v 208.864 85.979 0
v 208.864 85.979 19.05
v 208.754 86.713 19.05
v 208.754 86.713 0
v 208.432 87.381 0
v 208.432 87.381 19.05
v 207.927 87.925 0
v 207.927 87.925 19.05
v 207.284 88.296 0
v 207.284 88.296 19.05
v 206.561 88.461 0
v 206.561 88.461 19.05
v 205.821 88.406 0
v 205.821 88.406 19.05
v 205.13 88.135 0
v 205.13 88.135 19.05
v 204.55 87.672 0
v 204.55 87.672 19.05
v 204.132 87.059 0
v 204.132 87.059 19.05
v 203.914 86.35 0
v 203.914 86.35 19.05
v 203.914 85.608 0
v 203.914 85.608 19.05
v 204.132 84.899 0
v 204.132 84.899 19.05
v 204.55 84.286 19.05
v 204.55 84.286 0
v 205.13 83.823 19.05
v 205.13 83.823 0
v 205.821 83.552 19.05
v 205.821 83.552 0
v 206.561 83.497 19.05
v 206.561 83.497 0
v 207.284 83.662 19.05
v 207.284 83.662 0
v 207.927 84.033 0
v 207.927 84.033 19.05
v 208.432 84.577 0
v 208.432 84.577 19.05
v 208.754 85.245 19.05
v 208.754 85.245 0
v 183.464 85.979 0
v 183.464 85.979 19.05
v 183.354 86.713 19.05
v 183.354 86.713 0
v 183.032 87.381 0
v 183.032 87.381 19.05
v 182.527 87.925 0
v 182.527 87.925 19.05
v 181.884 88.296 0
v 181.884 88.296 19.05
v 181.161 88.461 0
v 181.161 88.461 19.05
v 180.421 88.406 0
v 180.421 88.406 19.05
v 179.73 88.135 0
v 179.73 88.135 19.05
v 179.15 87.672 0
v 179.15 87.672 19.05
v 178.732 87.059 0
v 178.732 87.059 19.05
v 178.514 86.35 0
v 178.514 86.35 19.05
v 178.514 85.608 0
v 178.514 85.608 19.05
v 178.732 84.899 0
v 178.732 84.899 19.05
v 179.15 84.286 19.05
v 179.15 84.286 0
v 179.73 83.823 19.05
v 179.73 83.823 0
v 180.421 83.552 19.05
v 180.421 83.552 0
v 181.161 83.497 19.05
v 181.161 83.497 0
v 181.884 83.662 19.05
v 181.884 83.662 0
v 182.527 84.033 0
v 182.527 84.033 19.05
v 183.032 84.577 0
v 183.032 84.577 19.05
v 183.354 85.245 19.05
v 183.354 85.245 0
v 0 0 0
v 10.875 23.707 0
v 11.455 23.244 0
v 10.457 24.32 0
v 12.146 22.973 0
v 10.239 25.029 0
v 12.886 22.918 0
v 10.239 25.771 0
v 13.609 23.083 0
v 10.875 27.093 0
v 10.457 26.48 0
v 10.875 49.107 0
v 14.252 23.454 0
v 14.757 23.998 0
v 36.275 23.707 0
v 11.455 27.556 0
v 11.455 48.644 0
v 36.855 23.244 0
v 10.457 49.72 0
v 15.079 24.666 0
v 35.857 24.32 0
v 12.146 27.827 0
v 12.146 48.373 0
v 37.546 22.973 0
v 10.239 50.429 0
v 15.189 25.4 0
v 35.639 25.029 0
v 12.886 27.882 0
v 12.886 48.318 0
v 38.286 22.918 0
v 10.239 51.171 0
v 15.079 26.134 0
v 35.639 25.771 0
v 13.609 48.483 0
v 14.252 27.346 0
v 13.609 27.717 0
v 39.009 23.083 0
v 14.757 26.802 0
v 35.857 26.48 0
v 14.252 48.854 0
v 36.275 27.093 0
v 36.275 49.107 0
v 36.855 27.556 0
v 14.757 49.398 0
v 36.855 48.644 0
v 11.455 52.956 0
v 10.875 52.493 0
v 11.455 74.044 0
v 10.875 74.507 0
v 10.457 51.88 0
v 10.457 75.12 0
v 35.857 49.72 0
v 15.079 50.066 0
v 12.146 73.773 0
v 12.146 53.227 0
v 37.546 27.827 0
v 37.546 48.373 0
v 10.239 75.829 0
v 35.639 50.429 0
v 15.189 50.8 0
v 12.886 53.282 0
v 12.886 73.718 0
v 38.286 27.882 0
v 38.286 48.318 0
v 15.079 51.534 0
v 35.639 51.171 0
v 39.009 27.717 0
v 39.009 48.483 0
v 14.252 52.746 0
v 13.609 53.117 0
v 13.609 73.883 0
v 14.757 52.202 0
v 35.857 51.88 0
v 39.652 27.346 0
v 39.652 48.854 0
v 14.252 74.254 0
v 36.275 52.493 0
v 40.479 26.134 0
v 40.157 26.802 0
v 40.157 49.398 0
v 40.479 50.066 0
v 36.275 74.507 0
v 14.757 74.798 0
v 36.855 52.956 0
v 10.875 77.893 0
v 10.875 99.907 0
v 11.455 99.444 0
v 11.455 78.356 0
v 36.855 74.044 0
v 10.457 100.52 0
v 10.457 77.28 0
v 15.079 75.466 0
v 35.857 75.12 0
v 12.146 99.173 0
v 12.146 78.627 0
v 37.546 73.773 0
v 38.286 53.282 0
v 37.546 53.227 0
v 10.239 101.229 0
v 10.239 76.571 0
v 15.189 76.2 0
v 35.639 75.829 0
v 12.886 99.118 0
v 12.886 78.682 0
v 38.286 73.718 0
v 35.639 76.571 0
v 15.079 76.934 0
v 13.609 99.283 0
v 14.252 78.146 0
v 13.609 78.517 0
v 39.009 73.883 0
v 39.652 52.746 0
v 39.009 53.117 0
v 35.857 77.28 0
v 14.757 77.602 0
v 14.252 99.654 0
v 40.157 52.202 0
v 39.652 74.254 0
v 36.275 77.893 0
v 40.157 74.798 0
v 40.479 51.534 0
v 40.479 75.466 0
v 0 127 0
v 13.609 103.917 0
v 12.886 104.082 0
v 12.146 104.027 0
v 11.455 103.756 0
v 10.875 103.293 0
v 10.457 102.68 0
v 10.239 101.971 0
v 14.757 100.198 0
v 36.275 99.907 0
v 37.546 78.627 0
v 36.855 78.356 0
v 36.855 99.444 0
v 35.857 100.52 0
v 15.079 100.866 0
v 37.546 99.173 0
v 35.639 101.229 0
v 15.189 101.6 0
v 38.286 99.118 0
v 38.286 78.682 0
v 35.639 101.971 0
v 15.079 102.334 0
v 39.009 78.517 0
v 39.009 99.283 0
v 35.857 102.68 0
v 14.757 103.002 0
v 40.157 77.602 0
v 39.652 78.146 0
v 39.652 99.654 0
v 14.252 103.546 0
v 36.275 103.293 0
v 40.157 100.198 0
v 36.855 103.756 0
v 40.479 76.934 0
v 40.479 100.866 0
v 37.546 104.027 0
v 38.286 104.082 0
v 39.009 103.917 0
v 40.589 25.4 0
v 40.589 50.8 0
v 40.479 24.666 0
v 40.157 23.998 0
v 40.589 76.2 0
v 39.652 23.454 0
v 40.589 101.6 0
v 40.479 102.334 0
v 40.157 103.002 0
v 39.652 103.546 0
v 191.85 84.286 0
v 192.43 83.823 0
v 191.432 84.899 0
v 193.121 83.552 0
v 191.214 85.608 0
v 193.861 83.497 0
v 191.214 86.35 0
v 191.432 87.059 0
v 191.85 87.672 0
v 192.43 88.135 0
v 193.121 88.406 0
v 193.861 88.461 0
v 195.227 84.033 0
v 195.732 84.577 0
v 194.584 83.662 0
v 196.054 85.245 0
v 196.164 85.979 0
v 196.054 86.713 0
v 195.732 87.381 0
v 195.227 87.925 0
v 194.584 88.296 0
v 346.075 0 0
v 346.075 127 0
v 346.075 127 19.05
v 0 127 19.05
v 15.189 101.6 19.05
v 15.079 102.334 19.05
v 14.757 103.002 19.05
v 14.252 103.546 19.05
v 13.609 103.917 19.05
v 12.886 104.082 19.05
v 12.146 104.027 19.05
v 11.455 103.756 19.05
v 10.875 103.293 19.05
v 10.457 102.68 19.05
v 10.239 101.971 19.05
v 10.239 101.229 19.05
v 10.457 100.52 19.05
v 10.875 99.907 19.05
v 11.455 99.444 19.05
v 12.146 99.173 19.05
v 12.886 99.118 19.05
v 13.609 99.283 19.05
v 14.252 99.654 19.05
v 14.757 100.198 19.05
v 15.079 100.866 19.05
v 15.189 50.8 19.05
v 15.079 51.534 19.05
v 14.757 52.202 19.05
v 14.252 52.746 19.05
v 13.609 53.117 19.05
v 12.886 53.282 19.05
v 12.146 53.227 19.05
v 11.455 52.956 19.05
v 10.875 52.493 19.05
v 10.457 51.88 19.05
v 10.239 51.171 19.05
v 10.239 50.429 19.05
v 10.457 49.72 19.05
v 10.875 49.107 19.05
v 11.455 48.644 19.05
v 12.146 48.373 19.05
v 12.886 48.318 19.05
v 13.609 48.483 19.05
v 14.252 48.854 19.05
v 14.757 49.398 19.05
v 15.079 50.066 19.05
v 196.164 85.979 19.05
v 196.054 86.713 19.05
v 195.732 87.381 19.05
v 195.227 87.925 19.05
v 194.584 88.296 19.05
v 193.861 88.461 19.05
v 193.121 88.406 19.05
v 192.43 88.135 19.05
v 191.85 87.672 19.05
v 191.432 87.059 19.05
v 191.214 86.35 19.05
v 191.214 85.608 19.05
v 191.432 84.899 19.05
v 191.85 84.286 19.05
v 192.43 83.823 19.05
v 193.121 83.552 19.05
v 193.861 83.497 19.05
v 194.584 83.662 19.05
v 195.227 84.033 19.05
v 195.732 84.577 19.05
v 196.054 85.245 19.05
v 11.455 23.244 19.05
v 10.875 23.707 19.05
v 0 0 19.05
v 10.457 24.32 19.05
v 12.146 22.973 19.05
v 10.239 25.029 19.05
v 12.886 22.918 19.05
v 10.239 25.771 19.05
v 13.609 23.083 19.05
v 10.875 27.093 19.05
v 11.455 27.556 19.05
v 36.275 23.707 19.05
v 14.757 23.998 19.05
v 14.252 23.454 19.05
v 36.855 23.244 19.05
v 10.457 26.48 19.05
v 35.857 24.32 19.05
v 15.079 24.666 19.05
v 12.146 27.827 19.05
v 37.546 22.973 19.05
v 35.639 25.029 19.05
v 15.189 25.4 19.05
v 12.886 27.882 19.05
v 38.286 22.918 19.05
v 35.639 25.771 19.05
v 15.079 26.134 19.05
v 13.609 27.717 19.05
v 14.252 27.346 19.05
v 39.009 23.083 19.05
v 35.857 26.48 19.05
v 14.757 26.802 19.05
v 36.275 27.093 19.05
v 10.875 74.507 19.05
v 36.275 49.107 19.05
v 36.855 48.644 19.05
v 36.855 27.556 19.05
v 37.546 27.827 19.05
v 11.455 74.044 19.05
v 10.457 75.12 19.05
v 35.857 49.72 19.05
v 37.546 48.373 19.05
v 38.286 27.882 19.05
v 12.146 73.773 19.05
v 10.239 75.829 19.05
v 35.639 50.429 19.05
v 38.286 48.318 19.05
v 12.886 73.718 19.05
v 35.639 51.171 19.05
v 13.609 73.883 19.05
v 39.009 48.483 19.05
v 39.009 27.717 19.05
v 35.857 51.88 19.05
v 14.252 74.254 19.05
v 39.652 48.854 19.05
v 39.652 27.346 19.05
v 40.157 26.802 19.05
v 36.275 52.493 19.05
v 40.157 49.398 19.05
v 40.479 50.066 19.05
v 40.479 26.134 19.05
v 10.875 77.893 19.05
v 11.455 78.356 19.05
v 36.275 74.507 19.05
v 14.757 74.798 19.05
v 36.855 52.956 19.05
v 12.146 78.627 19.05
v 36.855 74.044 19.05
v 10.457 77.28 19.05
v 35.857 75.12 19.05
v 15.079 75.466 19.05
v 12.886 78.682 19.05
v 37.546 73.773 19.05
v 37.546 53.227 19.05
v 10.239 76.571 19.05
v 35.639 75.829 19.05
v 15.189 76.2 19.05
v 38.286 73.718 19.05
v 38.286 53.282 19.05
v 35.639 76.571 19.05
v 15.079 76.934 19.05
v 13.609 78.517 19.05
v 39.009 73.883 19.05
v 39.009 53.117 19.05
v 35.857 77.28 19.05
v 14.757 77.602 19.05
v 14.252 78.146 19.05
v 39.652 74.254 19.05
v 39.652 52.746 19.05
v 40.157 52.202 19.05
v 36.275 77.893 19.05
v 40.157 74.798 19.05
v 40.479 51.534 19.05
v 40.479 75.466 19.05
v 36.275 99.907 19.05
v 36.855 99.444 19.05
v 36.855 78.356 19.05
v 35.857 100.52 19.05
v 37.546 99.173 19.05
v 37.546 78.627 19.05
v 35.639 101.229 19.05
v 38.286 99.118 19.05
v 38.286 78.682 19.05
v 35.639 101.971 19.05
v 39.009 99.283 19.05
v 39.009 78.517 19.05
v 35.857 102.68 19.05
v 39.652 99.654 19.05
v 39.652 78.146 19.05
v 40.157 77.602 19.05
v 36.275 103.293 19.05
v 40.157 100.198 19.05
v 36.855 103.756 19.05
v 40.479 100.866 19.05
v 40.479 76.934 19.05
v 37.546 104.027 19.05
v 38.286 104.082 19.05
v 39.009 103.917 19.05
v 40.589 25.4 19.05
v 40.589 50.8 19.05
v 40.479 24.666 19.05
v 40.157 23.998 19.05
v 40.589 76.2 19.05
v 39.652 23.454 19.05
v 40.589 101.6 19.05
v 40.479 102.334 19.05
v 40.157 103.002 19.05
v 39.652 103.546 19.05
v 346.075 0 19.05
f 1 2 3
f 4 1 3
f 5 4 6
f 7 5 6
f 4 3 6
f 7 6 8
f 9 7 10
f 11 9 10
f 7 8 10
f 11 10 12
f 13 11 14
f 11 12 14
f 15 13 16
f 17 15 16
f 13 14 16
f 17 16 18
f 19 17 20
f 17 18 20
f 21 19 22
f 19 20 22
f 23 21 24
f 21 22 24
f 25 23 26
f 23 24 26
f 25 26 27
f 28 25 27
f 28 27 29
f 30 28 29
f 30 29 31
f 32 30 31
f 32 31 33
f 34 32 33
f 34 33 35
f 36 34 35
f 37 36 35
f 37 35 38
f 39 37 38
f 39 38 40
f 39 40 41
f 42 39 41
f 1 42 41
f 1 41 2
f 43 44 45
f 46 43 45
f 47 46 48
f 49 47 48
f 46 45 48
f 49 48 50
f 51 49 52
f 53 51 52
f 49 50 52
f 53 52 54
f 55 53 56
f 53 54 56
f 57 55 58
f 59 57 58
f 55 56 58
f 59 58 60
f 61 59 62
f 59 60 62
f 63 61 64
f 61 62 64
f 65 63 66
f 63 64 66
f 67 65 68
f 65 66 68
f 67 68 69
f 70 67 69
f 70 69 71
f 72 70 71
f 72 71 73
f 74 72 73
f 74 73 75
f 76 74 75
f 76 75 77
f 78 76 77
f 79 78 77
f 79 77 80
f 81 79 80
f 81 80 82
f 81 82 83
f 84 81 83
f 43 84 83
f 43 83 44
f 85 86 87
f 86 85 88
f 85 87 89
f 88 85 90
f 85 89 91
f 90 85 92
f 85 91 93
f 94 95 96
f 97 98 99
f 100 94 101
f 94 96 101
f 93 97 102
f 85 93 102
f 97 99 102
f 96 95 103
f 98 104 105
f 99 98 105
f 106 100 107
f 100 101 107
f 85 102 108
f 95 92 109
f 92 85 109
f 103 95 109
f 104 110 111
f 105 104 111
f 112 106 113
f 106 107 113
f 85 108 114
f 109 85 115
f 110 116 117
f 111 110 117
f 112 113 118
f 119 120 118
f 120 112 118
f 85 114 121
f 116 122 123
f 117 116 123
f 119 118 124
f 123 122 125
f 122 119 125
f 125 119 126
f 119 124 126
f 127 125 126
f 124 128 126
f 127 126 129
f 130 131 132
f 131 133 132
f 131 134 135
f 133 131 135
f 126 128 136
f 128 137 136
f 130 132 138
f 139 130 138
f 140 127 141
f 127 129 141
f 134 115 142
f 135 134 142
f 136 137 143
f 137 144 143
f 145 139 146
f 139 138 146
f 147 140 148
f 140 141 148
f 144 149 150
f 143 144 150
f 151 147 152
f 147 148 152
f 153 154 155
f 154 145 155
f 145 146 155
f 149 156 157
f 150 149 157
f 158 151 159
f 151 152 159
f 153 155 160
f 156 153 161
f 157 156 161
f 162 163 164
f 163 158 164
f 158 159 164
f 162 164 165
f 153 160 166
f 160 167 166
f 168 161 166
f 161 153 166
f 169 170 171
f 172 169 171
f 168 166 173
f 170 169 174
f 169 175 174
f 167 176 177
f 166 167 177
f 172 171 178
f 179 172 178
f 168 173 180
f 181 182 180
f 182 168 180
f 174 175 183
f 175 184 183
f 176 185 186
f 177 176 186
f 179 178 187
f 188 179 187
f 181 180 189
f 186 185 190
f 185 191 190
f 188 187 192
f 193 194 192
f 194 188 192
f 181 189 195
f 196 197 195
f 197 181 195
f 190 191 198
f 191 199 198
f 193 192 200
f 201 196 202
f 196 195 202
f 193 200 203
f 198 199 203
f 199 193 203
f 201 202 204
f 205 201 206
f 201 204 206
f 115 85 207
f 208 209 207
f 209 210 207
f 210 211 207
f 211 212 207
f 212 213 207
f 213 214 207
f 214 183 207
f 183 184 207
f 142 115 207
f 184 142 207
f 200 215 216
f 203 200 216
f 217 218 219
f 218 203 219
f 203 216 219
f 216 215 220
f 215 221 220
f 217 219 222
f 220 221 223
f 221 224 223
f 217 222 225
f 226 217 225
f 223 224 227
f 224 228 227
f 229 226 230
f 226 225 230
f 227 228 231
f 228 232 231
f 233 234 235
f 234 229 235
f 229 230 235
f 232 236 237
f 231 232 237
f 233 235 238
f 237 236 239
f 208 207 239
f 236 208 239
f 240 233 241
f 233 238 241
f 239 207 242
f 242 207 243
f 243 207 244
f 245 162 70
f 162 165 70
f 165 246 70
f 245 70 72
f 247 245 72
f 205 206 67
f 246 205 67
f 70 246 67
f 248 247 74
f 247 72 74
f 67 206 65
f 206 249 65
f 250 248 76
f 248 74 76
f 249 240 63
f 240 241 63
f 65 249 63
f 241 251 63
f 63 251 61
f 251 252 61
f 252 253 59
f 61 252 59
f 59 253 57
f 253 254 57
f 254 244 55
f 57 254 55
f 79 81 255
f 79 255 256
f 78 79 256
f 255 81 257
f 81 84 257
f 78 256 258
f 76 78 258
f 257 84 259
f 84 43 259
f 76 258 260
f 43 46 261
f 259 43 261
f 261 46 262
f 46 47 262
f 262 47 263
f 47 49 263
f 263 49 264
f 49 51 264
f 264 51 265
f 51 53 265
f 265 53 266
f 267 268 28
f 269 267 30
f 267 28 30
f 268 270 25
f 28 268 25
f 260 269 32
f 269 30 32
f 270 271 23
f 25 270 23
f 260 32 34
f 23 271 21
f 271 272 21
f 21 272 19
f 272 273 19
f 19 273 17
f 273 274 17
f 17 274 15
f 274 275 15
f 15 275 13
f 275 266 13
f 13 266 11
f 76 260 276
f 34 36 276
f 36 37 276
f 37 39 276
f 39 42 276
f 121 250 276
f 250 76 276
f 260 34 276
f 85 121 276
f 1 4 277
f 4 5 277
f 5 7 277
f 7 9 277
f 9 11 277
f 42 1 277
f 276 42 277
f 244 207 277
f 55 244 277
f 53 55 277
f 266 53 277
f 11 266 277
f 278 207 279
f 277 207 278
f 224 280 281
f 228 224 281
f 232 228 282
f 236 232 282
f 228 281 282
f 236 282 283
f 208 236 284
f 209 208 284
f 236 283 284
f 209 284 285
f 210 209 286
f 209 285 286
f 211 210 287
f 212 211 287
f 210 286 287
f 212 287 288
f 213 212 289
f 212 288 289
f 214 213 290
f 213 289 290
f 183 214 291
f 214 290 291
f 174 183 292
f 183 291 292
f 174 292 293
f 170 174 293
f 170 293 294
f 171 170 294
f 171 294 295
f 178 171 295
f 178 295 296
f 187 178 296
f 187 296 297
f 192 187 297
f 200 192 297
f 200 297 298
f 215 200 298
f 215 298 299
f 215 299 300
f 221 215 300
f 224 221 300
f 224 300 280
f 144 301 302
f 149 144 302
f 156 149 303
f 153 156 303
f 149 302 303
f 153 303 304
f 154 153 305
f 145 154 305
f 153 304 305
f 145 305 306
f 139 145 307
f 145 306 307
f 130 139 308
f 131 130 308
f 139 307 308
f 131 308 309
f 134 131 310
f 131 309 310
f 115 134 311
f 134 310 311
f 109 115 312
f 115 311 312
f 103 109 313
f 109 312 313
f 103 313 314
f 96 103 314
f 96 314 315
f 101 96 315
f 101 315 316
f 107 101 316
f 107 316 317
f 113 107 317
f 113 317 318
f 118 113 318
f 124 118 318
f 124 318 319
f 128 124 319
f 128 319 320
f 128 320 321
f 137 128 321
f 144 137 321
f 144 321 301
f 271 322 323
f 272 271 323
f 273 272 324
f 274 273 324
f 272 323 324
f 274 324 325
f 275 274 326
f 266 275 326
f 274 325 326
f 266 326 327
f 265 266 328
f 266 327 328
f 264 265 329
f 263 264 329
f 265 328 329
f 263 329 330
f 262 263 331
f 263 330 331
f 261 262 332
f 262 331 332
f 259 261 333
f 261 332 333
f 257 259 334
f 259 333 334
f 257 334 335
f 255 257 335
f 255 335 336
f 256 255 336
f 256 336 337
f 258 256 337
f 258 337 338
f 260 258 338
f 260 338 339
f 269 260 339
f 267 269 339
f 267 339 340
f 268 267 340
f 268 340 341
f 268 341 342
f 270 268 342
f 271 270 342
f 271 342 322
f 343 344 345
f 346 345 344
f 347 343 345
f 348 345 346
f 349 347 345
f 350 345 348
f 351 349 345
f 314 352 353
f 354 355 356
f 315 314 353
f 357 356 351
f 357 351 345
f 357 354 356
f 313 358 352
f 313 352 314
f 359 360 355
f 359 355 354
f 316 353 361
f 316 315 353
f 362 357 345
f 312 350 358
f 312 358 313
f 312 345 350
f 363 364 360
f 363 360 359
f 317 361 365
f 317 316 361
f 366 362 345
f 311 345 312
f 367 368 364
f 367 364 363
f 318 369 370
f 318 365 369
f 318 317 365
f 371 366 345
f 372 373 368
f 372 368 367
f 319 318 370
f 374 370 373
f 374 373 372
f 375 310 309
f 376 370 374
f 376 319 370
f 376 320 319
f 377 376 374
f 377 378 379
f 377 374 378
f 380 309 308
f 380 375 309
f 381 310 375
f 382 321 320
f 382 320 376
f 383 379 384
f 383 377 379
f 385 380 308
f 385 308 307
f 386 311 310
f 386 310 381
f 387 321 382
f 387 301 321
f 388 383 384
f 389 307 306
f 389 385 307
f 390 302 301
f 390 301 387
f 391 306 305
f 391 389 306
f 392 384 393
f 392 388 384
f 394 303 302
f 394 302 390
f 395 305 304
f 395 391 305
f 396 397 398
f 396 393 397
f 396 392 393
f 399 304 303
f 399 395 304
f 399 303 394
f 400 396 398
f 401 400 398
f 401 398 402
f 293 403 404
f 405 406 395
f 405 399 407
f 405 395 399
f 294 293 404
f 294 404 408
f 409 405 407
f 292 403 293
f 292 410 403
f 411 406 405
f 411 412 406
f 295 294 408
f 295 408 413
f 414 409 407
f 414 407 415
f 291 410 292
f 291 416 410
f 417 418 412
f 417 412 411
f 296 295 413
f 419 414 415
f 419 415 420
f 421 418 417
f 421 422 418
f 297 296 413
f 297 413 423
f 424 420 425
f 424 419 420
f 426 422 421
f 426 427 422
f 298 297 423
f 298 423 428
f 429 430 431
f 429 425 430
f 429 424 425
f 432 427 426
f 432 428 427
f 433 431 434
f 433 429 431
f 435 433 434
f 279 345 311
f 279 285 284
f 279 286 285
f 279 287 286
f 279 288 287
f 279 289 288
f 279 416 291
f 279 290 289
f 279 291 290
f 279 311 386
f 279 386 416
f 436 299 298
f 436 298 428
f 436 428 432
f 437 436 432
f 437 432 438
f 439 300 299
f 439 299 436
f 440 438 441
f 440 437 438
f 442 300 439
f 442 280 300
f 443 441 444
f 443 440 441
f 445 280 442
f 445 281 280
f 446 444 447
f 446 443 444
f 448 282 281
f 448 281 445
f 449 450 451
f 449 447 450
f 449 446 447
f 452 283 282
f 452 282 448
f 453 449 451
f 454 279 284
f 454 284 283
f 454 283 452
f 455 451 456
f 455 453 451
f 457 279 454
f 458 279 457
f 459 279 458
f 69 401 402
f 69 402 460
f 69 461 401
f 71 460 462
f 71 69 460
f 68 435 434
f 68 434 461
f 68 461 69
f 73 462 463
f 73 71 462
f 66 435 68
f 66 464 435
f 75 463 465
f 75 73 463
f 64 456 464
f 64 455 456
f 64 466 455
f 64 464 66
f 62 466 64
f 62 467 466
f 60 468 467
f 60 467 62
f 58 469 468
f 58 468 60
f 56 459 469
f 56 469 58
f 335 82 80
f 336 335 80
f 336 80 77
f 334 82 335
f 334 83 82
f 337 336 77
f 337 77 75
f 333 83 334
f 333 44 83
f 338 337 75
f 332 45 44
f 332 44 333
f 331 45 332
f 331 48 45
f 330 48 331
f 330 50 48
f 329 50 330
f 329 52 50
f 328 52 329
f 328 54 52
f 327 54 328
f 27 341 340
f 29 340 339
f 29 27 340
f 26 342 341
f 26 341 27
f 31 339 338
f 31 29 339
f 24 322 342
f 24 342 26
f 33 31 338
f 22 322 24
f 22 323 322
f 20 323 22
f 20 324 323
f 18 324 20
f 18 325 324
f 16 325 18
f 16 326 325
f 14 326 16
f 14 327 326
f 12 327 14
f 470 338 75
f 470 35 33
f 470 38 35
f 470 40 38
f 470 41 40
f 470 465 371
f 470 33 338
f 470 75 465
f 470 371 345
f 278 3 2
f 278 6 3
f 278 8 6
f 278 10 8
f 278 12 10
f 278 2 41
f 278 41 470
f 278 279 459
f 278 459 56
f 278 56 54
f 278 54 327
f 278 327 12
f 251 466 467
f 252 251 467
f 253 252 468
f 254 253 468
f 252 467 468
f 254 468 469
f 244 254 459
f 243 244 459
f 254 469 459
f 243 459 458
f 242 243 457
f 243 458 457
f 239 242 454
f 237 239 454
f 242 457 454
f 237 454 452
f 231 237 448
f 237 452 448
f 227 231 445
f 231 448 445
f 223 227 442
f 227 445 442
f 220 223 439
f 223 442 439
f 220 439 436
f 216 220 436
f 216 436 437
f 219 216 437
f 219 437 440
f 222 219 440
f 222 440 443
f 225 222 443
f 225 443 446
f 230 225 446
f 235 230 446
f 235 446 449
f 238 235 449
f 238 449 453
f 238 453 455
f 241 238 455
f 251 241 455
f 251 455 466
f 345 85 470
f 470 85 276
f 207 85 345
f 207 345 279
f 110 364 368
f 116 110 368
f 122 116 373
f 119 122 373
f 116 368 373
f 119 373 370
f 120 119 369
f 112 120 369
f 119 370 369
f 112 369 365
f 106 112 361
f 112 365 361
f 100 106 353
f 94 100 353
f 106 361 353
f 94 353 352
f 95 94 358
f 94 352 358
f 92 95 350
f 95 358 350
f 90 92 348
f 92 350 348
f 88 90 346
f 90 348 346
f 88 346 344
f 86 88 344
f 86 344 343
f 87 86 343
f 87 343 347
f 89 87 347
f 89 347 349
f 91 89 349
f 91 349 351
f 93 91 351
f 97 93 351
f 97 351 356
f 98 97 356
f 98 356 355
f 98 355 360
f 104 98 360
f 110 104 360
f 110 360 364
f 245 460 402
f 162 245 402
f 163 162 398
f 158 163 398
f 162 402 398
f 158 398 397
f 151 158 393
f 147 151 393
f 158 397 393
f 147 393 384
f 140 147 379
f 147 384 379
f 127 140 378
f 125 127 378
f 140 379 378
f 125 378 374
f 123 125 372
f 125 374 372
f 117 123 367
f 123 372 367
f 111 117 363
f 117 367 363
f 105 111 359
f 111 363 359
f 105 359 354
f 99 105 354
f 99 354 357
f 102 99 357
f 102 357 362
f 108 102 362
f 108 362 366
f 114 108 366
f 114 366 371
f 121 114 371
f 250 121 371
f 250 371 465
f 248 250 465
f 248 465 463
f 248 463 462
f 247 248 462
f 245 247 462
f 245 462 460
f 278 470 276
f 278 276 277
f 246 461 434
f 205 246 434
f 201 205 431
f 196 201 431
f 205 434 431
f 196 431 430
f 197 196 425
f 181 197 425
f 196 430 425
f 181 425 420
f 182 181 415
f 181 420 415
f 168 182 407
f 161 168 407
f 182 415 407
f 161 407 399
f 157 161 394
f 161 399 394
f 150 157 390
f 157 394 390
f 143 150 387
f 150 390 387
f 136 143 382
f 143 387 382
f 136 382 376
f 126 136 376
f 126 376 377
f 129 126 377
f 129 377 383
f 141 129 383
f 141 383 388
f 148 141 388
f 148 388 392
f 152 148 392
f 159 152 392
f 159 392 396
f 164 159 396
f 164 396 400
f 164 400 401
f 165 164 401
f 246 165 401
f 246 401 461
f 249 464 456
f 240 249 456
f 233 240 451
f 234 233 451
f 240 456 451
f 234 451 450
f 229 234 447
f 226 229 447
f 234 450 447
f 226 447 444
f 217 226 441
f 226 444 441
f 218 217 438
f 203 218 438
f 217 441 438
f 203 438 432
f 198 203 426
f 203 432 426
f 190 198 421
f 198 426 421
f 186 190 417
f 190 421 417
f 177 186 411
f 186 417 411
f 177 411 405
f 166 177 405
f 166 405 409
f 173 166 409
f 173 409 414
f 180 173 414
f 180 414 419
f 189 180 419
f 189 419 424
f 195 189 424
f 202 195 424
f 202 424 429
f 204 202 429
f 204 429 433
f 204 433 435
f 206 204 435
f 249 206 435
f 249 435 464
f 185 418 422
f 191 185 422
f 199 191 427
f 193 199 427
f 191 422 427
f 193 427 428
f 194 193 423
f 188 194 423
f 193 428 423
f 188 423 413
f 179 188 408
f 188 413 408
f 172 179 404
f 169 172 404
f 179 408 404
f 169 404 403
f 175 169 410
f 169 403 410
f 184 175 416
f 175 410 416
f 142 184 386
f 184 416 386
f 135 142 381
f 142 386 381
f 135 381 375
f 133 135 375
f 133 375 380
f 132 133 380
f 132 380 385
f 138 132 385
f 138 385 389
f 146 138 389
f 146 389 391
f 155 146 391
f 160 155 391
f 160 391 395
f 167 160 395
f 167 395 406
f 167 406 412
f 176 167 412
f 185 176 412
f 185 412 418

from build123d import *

# Parameters (mm, degrees)
SKETCH1_W           = 717.55
SKETCH1_H           = 127
BOSS_EXTRUDE1_DEPTH = 19.05
SKETCH2_R           = 2.4892
CUT_EXTRUDE1_DEPTH  = 25.4
SKETCH4_R           = 2.4892
CUT_EXTRUDE2_DEPTH  = 729.951236366
SKETCH5_W           = 371.475
SKETCH5_H           = 127
CUT_EXTRUDE3_DEPTH  = 729.951236366


with BuildPart() as part:
    # Sketch1 → Boss-Extrude1 (new body)
    with BuildSketch(Plane.XY):
        with Locations((358.775, 63.5)):
            Rectangle(SKETCH1_W, SKETCH1_H)
    extrude(amount=BOSS_EXTRUDE1_DEPTH)

    # Sketch2 → Cut-Extrude1 (cut)
    with BuildSketch(Plane.XY.offset(19.05)):
        with Locations((12.7, 101.6)):
            Circle(SKETCH2_R)
        with Locations((38.1, 101.6)):
            Circle(SKETCH2_R)
        with Locations((38.1, 76.2)):
            Circle(SKETCH2_R)
        with Locations((38.1, 50.8)):
            Circle(SKETCH2_R)
        with Locations((38.1, 25.4)):
            Circle(SKETCH2_R)
        with Locations((12.7, 76.2)):
            Circle(SKETCH2_R)
        with Locations((12.7, 50.8)):
            Circle(SKETCH2_R)
        with Locations((12.7, 25.4)):
            Circle(SKETCH2_R)
        with Locations((685.8, 101.6)):
            Circle(SKETCH2_R)
        with Locations((660.4, 101.6)):
            Circle(SKETCH2_R)
        with Locations((660.4, 76.2)):
            Circle(SKETCH2_R)
        with Locations((660.4, 50.8)):
            Circle(SKETCH2_R)
        with Locations((660.4, 25.4)):
            Circle(SKETCH2_R)
        with Locations((685.8, 76.2)):
            Circle(SKETCH2_R)
        with Locations((685.8, 50.8)):
            Circle(SKETCH2_R)
        with Locations((685.8, 25.4)):
            Circle(SKETCH2_R)
    extrude(amount=-CUT_EXTRUDE1_DEPTH, mode=Mode.SUBTRACT)

    # Sketch4 → Cut-Extrude2 (cut, through all)
    with BuildSketch(Plane.XY.offset(19.05)):
        with Locations((180.975, 85.979)):
            Circle(SKETCH4_R)
        with Locations((193.675, 85.979)):
            Circle(SKETCH4_R)
        with Locations((206.375, 85.979)):
            Circle(SKETCH4_R)
        with Locations((492.125, 85.979)):
            Circle(SKETCH4_R)
        with Locations((504.825, 85.979)):
            Circle(SKETCH4_R)
        with Locations((517.525, 85.979)):
            Circle(SKETCH4_R)
    extrude(amount=-CUT_EXTRUDE2_DEPTH, mode=Mode.SUBTRACT)

    # Sketch5 → Cut-Extrude3 (cut, through all)
    with BuildSketch(Plane.XY.offset(19.05)):
        with Locations((531.8125, 63.5)):
            Rectangle(SKETCH5_W, SKETCH5_H)
    extrude(amount=-CUT_EXTRUDE3_DEPTH, mode=Mode.SUBTRACT)


solid = part.part
